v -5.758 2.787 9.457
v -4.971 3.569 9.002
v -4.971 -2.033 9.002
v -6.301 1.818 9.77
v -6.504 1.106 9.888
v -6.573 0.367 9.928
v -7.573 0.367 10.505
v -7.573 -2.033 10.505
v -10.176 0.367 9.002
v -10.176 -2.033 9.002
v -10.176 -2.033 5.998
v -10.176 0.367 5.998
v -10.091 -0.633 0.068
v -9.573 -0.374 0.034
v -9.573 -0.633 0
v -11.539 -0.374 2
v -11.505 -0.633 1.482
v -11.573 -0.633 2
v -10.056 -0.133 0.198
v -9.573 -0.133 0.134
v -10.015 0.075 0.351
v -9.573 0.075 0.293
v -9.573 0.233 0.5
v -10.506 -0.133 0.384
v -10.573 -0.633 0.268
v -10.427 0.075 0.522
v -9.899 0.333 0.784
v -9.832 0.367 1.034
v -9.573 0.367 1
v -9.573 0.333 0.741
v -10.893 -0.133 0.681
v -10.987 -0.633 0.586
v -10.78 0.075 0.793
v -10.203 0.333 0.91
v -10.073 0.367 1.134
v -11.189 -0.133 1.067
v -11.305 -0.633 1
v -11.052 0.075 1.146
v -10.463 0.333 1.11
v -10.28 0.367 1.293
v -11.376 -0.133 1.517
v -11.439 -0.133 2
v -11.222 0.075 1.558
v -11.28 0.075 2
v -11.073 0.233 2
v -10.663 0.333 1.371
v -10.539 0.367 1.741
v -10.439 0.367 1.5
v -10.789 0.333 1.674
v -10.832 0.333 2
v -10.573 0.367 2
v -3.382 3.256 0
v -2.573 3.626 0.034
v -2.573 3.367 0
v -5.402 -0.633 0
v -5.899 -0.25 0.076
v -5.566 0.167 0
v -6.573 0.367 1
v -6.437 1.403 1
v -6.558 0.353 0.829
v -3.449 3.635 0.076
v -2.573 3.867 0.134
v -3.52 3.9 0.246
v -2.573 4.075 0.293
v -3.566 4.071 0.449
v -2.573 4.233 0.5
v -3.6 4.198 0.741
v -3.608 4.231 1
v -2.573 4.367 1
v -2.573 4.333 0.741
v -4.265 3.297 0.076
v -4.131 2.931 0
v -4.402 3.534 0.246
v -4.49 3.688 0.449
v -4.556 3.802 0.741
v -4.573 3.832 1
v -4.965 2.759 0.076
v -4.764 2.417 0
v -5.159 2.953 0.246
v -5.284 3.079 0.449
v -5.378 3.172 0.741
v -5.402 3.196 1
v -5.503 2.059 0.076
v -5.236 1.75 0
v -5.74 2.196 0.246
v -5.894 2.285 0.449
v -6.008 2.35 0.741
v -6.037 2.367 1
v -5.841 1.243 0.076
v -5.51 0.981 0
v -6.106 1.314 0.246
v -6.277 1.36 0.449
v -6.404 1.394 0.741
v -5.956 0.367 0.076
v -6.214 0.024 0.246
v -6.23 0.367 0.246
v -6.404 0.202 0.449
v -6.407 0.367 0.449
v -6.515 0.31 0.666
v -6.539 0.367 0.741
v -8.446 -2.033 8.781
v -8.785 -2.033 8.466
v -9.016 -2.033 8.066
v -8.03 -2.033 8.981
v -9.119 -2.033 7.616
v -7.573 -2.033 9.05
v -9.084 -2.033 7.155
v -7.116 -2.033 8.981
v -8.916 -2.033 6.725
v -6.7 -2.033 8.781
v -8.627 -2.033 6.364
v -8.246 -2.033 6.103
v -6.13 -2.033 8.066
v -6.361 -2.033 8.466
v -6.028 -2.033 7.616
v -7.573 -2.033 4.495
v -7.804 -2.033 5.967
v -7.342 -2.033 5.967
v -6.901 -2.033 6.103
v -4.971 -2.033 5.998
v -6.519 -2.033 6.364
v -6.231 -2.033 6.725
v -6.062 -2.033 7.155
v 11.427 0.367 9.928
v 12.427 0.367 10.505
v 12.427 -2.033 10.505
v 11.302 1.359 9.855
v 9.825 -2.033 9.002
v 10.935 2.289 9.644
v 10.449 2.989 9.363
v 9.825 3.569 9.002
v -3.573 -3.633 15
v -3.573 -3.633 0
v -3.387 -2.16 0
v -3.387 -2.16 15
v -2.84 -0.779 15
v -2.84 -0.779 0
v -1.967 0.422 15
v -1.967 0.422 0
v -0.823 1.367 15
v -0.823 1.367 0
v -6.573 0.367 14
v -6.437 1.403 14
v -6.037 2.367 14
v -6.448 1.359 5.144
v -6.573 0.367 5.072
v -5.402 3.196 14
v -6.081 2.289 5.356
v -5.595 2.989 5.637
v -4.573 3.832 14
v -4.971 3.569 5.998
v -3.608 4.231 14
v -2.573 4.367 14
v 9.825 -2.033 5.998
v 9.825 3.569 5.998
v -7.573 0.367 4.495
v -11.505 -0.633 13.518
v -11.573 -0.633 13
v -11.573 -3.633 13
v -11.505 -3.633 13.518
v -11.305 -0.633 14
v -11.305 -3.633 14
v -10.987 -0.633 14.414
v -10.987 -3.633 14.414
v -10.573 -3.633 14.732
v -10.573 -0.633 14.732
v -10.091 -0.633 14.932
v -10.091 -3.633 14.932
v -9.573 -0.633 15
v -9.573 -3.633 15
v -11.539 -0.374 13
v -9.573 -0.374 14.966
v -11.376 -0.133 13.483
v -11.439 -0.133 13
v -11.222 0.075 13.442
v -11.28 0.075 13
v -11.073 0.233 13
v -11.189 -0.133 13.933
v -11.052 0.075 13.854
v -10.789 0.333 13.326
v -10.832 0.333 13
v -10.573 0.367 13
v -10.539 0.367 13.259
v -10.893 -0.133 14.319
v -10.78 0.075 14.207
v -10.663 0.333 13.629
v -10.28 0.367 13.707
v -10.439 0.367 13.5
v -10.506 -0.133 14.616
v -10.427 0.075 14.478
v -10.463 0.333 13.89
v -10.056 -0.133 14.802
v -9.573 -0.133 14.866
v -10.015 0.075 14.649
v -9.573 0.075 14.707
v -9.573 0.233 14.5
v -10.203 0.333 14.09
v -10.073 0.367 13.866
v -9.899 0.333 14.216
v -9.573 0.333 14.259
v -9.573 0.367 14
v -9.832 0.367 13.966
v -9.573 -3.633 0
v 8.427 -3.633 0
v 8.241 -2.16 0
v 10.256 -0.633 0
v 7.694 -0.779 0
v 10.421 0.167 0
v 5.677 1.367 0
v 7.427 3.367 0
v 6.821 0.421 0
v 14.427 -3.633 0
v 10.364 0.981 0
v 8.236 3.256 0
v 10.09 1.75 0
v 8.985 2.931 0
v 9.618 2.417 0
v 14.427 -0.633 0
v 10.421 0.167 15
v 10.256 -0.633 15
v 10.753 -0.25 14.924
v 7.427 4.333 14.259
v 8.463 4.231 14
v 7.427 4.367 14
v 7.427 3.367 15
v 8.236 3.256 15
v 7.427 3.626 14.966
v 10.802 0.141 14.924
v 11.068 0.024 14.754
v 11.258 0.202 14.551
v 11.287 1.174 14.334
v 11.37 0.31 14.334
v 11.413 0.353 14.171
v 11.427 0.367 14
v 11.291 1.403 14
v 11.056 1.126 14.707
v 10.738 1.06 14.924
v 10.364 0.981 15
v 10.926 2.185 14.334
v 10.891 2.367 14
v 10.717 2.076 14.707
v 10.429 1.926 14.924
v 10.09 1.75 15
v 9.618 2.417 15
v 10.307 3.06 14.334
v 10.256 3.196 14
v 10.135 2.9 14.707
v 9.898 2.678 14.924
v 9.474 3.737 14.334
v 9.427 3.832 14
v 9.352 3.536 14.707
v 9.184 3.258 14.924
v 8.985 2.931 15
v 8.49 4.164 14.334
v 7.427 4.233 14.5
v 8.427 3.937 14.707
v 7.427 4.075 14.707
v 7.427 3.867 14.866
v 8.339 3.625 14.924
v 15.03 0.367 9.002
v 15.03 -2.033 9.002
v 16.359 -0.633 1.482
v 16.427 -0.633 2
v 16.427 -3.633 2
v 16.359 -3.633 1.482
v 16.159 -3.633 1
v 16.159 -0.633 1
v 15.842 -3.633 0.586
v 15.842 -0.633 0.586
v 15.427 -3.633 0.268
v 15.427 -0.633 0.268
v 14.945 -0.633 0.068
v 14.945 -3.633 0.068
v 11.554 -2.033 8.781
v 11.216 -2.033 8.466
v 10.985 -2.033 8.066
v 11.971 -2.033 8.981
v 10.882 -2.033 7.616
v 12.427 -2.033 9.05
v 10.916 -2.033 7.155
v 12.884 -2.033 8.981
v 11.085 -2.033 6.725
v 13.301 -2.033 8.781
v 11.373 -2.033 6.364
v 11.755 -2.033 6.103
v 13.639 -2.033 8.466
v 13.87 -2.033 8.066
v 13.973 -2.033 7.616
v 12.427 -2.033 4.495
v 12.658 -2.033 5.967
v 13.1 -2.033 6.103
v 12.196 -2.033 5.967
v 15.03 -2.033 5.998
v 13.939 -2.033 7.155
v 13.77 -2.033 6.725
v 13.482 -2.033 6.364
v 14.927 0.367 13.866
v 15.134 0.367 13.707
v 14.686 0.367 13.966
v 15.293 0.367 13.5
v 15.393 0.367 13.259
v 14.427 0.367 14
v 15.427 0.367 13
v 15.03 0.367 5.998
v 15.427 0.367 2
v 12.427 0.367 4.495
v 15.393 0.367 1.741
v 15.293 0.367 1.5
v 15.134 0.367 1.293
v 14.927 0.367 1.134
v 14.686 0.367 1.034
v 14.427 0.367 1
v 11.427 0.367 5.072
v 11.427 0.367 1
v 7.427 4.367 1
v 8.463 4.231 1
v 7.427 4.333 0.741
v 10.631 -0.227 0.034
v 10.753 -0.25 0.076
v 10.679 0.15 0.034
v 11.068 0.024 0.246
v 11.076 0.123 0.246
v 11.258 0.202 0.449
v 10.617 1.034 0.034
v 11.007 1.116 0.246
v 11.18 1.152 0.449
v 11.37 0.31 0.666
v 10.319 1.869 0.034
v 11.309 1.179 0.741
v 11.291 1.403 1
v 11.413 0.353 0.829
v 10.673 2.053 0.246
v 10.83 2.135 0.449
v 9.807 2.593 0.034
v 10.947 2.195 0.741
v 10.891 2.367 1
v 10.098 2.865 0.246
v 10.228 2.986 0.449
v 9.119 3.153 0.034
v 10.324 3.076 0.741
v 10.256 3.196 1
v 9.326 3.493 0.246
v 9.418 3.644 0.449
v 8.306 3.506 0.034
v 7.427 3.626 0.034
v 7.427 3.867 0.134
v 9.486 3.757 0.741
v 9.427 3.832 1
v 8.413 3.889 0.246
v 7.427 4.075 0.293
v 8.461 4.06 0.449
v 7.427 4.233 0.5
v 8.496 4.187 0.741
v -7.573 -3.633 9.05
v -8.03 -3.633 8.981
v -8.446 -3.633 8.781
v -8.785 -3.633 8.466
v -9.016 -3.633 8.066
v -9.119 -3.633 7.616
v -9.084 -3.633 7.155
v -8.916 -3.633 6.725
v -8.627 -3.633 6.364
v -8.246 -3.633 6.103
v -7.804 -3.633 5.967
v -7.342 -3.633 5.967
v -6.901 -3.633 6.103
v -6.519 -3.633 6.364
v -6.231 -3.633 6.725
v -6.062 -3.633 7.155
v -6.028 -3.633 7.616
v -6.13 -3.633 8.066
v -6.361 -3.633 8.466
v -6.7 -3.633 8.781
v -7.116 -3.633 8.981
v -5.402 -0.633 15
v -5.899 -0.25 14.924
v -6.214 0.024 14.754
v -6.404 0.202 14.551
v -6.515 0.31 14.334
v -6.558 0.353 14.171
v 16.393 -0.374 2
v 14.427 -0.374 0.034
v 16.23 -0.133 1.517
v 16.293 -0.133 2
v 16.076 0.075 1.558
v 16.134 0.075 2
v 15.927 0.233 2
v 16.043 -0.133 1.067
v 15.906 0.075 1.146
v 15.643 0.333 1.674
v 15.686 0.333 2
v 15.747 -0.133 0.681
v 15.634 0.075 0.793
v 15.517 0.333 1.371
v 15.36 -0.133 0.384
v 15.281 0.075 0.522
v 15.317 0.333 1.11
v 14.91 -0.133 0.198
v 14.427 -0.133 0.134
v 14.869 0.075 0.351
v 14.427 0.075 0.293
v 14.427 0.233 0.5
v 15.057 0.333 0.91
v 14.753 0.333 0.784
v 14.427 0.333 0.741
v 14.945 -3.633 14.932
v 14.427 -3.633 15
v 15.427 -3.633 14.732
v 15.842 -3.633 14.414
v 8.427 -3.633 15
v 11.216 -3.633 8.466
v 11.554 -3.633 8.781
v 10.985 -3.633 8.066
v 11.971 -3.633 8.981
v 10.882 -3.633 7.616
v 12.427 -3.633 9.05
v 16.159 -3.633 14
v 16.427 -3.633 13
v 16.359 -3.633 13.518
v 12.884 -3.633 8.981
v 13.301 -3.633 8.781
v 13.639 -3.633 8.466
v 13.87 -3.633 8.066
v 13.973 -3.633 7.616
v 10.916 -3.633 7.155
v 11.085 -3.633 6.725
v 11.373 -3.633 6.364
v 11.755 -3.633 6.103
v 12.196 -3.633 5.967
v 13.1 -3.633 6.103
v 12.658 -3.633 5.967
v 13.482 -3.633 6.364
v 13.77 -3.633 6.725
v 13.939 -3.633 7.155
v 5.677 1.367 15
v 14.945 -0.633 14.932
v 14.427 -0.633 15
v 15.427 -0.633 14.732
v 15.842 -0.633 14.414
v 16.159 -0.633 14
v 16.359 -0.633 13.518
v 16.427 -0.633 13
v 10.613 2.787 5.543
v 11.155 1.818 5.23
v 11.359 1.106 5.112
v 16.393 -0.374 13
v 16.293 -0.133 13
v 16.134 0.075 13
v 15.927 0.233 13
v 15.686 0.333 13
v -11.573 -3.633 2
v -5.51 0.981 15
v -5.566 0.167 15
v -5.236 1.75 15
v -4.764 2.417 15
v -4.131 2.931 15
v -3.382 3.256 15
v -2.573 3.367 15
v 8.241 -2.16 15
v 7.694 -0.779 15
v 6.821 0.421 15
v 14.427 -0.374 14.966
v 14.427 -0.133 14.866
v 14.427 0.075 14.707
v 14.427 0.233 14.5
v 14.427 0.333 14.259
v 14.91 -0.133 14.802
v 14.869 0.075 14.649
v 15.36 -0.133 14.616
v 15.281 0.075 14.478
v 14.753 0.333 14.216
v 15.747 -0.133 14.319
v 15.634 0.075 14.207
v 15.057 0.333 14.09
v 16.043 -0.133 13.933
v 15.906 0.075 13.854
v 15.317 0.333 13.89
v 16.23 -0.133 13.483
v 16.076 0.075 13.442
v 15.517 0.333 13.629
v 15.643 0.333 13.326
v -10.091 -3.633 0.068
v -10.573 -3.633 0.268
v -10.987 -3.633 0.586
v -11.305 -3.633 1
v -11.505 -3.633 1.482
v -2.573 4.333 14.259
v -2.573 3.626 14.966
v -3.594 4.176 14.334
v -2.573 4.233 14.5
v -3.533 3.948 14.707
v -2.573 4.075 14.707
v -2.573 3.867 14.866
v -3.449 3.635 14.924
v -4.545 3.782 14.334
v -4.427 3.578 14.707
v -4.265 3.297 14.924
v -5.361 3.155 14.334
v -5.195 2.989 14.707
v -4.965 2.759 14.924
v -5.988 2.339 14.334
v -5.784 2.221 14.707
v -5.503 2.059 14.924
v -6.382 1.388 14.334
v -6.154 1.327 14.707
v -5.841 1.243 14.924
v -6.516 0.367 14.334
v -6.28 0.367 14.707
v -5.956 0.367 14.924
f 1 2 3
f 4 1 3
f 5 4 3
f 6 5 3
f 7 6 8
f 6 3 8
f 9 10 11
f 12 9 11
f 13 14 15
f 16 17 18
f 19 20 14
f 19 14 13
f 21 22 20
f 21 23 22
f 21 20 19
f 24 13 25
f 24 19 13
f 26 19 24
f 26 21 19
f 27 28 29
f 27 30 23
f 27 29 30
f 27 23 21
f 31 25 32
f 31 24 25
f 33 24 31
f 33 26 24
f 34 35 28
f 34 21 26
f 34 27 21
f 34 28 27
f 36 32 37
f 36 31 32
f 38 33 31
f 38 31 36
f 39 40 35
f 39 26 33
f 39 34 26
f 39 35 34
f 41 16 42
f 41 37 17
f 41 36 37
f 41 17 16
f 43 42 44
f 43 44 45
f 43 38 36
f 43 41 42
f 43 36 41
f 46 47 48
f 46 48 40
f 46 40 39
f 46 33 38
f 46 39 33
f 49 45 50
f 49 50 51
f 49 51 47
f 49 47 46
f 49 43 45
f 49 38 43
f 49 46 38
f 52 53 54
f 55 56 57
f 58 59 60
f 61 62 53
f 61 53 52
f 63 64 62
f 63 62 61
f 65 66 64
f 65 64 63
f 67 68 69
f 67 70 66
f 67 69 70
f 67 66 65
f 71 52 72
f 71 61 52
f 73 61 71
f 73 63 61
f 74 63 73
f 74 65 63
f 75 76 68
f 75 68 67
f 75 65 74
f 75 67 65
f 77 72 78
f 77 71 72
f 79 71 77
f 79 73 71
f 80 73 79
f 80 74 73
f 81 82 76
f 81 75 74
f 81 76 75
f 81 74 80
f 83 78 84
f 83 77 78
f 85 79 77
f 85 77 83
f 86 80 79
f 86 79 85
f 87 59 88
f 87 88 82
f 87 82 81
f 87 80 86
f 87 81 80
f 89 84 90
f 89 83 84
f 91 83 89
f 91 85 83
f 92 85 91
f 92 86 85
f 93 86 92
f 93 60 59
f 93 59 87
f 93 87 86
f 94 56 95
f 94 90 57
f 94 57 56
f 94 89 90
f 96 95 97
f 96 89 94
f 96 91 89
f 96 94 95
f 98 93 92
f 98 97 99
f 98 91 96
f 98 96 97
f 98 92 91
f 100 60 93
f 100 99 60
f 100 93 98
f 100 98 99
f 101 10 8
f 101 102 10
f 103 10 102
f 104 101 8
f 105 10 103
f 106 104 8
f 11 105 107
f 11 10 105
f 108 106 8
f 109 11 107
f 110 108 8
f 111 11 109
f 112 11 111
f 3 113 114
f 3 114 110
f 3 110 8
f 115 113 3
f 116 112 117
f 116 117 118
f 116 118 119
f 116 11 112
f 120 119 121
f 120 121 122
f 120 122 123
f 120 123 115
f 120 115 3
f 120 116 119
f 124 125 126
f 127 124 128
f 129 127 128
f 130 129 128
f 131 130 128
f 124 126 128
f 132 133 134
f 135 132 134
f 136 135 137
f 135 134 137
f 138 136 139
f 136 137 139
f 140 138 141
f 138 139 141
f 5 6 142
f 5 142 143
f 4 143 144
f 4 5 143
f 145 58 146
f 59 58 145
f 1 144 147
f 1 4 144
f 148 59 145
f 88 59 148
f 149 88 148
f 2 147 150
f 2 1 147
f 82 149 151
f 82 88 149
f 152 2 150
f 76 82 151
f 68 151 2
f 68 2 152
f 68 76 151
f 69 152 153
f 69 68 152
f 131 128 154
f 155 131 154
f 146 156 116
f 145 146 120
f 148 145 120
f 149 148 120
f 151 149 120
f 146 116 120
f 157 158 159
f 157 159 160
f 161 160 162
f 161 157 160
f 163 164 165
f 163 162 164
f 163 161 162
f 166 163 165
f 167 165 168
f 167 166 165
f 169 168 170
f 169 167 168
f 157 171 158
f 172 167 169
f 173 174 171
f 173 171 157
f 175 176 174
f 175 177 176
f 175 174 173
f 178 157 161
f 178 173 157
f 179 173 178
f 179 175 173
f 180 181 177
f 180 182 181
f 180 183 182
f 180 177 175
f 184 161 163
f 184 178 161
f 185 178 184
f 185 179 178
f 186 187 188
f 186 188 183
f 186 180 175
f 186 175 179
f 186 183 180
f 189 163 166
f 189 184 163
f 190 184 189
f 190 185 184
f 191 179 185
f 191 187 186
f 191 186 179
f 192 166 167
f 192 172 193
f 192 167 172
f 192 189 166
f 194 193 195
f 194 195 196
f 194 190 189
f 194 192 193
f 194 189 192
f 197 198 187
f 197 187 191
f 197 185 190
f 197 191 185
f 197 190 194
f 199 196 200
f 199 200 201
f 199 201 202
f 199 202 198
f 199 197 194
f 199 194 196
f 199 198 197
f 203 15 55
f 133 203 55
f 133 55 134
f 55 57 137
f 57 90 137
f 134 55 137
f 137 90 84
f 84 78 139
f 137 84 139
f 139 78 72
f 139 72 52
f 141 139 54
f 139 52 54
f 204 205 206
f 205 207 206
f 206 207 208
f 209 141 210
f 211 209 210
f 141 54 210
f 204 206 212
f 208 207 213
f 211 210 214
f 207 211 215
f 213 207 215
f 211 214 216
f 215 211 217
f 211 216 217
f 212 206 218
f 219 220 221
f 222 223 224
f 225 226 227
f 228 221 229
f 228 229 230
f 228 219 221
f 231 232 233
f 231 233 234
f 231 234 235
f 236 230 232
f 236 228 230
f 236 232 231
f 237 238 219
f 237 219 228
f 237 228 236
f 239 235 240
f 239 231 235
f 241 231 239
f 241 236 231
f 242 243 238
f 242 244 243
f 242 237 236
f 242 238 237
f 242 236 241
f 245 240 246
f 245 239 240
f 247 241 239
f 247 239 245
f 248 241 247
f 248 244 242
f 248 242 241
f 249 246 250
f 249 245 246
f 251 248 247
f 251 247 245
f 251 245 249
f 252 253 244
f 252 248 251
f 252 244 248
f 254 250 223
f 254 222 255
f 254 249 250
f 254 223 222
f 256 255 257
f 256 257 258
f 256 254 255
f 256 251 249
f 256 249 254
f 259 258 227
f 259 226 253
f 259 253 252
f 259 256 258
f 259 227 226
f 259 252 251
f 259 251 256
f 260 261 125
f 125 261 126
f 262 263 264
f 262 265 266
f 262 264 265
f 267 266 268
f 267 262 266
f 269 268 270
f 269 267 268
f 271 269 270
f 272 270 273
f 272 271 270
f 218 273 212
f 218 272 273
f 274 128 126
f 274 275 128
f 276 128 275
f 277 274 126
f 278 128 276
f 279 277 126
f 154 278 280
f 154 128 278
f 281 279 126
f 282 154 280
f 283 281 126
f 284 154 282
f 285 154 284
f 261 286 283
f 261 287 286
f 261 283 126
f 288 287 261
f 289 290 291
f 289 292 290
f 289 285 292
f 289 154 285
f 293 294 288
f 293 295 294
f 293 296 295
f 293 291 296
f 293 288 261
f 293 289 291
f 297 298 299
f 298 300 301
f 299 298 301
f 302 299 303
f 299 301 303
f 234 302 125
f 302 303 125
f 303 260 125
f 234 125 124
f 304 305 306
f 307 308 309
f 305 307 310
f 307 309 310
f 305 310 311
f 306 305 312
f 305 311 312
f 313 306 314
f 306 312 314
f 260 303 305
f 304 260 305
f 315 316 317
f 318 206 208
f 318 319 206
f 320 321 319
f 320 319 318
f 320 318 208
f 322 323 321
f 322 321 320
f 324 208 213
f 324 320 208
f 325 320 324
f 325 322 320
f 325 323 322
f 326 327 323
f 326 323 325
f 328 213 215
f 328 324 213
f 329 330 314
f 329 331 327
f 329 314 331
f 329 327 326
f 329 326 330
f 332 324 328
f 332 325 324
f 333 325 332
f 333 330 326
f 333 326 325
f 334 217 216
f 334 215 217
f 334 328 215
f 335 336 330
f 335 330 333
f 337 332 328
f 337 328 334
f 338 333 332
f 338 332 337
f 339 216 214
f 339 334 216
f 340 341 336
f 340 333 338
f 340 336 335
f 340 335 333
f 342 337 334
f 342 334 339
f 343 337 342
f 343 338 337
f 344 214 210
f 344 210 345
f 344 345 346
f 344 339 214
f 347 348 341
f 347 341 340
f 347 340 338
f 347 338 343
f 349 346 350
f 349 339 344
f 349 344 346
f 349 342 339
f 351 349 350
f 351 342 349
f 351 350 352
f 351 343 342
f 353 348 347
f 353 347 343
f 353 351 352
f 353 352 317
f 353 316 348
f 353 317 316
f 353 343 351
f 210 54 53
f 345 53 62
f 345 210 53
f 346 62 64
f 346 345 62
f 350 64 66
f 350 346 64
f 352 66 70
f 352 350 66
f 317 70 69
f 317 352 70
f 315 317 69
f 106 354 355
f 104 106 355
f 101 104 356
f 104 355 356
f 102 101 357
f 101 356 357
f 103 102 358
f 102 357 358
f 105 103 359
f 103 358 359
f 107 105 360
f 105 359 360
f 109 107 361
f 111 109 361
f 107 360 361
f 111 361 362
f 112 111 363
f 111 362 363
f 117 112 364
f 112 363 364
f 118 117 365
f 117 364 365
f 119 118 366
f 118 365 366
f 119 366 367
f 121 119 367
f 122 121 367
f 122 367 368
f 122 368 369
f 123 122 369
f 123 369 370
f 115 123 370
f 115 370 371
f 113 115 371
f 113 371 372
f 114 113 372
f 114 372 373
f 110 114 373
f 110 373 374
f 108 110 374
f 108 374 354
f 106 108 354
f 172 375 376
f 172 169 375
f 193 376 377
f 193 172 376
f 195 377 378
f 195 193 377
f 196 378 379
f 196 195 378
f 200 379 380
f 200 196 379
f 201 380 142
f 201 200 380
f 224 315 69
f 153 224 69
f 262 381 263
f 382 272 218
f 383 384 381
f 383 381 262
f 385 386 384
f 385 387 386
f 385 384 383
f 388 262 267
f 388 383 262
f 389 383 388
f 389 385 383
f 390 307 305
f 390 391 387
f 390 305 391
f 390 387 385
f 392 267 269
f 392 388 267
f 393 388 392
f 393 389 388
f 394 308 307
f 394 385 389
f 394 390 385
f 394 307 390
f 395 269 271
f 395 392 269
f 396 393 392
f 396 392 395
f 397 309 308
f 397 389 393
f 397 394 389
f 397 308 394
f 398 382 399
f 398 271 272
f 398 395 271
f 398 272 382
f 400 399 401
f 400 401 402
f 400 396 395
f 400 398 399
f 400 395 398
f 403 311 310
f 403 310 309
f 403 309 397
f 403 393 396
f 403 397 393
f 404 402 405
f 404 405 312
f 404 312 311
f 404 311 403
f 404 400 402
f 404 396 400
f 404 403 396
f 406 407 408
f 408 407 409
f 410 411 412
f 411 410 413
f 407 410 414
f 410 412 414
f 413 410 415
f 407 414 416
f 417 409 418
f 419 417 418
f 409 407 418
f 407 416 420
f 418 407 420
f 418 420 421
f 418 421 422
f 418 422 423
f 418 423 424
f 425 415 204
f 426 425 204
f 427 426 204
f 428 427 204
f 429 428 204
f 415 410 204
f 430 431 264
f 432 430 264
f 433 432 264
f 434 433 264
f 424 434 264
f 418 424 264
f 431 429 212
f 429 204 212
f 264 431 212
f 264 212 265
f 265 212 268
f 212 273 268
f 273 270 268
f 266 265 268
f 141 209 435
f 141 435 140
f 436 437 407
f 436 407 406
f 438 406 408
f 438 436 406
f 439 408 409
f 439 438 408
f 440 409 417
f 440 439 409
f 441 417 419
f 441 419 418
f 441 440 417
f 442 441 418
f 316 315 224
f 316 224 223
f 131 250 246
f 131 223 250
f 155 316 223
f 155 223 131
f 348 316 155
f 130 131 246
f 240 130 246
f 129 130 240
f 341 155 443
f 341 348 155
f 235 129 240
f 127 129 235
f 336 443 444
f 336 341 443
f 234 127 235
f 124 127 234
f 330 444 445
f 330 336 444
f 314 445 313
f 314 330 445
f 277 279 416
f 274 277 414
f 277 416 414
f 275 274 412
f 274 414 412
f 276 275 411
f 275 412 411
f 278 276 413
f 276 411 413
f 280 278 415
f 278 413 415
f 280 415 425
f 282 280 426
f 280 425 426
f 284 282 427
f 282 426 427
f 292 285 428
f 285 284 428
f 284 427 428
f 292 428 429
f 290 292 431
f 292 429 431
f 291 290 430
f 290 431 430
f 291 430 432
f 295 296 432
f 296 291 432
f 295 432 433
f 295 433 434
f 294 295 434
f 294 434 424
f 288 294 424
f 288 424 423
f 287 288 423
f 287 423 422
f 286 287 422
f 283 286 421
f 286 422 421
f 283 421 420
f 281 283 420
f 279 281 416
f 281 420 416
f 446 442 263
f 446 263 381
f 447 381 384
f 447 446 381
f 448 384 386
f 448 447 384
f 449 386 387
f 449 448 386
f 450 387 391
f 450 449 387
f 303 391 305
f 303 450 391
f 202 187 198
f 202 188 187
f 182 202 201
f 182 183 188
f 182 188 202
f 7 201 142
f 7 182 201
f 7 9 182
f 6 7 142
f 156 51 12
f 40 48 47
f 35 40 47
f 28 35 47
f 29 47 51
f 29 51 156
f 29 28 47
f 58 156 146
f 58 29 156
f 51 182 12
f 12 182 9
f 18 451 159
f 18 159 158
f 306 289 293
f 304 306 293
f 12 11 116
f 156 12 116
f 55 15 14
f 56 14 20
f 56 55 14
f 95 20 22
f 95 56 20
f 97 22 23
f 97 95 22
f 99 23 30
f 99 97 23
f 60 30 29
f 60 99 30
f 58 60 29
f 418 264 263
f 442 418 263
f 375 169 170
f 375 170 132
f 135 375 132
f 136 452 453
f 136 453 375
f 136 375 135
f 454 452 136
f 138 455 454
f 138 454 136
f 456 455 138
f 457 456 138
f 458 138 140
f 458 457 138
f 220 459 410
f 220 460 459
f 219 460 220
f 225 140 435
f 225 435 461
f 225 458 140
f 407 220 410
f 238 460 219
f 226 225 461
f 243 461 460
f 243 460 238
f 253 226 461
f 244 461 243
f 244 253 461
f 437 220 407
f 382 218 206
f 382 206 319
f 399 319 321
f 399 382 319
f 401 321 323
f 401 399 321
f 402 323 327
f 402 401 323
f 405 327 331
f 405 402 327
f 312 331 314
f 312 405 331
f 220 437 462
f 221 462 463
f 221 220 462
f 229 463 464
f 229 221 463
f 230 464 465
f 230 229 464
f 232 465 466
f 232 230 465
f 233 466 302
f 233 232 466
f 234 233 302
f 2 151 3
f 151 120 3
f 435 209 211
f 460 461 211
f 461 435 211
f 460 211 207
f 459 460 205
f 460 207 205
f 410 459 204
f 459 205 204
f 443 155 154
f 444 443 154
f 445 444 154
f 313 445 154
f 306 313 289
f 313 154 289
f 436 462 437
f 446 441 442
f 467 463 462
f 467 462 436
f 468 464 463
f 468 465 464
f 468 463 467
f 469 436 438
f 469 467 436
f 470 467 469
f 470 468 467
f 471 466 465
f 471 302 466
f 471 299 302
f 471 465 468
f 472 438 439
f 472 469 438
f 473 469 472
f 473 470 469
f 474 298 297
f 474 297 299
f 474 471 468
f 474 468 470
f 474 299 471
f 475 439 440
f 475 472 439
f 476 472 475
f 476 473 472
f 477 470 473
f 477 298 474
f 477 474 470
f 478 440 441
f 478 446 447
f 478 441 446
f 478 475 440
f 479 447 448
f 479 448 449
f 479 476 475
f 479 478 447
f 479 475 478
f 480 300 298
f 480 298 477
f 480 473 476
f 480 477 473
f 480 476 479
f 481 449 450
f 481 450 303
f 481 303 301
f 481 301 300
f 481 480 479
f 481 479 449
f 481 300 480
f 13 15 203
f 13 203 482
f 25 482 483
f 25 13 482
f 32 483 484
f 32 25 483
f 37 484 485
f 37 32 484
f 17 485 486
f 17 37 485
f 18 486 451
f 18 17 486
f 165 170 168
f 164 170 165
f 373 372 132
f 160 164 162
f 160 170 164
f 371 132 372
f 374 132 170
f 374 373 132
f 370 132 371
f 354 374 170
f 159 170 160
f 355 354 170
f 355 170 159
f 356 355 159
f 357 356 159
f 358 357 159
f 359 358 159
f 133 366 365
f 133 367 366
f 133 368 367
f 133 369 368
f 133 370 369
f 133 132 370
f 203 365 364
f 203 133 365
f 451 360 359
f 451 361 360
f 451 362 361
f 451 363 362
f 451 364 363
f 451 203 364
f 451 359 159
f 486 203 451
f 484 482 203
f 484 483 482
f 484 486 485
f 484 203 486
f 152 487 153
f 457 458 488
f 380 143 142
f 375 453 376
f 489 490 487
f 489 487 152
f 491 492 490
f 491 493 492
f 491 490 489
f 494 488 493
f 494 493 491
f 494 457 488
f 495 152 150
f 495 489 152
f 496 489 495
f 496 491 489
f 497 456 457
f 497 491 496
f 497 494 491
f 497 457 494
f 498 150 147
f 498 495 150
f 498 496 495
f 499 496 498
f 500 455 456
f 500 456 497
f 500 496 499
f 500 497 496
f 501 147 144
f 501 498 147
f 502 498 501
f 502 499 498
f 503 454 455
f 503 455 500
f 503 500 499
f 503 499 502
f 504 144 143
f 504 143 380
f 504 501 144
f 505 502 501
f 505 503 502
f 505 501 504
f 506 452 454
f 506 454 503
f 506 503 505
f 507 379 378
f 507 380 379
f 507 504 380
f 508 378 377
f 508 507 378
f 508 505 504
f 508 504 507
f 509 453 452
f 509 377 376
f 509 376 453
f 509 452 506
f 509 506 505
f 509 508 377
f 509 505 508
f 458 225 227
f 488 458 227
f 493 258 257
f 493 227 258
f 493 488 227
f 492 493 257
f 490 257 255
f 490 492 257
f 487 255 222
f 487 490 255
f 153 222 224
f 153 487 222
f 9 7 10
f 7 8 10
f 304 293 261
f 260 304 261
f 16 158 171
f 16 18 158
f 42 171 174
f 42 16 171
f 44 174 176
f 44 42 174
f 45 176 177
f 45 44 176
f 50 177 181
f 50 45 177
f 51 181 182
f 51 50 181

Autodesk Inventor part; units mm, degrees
ref_plane "YZ Plane" through (0, 0, 0) normal (1, 0, 0) x (0, 1, 0)
sketch "Sketch3" plane through (0, 0, 0) normal (0, 0, 1) x (1, 0, 0)
  line L0 (2.4271, 1.3674) -> (5.6771, 1.3674)
  arc A0 (8.4273, -3.6326) -> (5.6771, 1.3674) centre (2.5072, -3.6326) ccw
  line L1 (8.4273, -3.6326) -> (8.4273, -3.6326)
  line L2 (8.4273, -3.6326) -> (16.4273, -3.6326)
  line L3 (16.4273, -3.6326) -> (16.4273, 0.3674)
  line L4 (16.4273, 0.3674) -> (11.4273, 0.3674)
  line L5 (2.4271, 4.3674) -> (7.4273, 4.3674)
  line L6 (11.4273, 0.3674) -> (11.4273, 0.3674)
  arc A1 (11.4273, 0.3674) -> (7.4273, 4.3674) centre (7.4273, 0.3674) ccw
  arc A2 (-0.8229, 1.3674) -> (-3.5732, -3.6326) centre (2.3469, -3.6326) ccw
  line L7 (-3.5732, -3.6326) -> (-3.5732, -3.6326)
  line L8 (-3.5732, -3.6326) -> (-11.5732, -3.6326)
  line L9 (-11.5732, -3.6326) -> (-11.5732, 0.3674)
  line L10 (-11.5732, 0.3674) -> (-6.5732, 0.3674)
  line L11 (-6.5732, 0.3674) -> (-6.5732, 0.3674)
  arc A3 (-2.5732, 4.3674) -> (-6.5732, 0.3674) centre (-2.5732, 0.3674) ccw
  line L12 (2.4271, 4.3674) -> (-2.5732, 4.3674)
  line L13 (2.4271, 1.3674) -> (-0.8229, 1.3674)
  point P0 (0, 0)
  point P1 (11.4273, 0.3674)
  point P2 (-6.5732, 0.3674)
  dimension "d20" = 4
  dimension "d21" = 5
  dimension "d22" = 8
  dimension "d23" = 3
extrude "Extrusion2" add sketch "Sketch3" along normal blind 15
ref_plane "Work Plane1" through (2.4271, -3.6326, 0) normal (-1, 0, 0) x (0, 0, 1)
sketch "Sketch4" plane through (-11.5732, 0.3674, 0) normal (0, 1, 0) x (1, 0, 0)
  line L0 (4, -4.495) -> (6.6024, -5.9975)
  line L1 (6.6024, -5.9975) -> (6.6024, -9.0025)
  line L2 (6.6024, -9.0025) -> (4, -10.505)
  line L3 (4, -10.505) -> (1.3976, -9.0025)
  line L4 (1.3976, -9.0025) -> (1.3976, -5.9975)
  line L5 (1.3976, -5.9975) -> (4, -4.495)
  line L6 (0, 0) -> (0, -15) projected
  line L7 (14.0003, -18) -> (14.0003, 3) projected
  line L8 (5, 0) -> (0, 0) projected
  point P0 (11.5732, 0)
  point P1 (4, -7.5)
  point P2 (4, -7.5)
  dimension "d26" = 6.01
  dimension "d27" = 4
  dimension "d39" = 7.5
extrude "Extrusion3" cut sketch "Sketch4" along normal blind 8 and the other way blind 2.4
sketch "Sketch5" plane through (-11.5732, -2.0326, 0) normal (0, 1, 0) x (1, 0, 0)
  line L0 (6.6024, -5.9975) -> (6.6024, -9.0025) projected
  line L1 (1.3976, -9.0025) -> (1.3976, -5.9975) projected
  line L2 (5, 0) -> (0, 0) projected
  point P0 (11.5732, 0)
  point P1 (4, -7.5)
  dimension "d40" = 7.5
hole "Hole1" at (-7.5732, -2.0326, 7.5) direction (0, -1, 0) diameter 3.1 end through all
mirror "Mirror1" about plane through (2.4271, -3.6326, 0) normal (-1, 0, 0) of "Extrusion3", "Hole1"
ref_plane "Work Plane2" through (0, 0, 7.5) normal (0, 0, 1) x (1, 0, 0)
fillet "Fillet3" radius 2 4 edges at (16.4273, -1.6326, 0) (16.4273, -1.6326, 15) (-11.5732, -1.6326, 15) (-11.5732, -1.6326, 0)
fillet "Fillet4" radius 1 16 edges at (15.8415, 0.3674, 0.5858) (16.4273, 0.3674, 7.5) (15.8415, 0.3674, 14.4142) (12.9273, 0.3674, 15) (12.9273, 0.3674, 0) (2.4271, 4.3674, 0) (-5.4016, 3.1958, 0) (10.2558, 3.1958, 0) (-8.0732, 0.3674, 0) (-11.5732, 0.3674, 7.5) (-10.9874, 0.3674, 14.4142) (-8.0732, 0.3674, 15) (-10.9874, 0.3674, 0.5858) (2.4271, 4.3674, 15) (10.2558, 3.1958, 15) (-5.4016, 3.1958, 15)
properties part number "mocowanie_silnika_CPY" material "ABS Plastic"
